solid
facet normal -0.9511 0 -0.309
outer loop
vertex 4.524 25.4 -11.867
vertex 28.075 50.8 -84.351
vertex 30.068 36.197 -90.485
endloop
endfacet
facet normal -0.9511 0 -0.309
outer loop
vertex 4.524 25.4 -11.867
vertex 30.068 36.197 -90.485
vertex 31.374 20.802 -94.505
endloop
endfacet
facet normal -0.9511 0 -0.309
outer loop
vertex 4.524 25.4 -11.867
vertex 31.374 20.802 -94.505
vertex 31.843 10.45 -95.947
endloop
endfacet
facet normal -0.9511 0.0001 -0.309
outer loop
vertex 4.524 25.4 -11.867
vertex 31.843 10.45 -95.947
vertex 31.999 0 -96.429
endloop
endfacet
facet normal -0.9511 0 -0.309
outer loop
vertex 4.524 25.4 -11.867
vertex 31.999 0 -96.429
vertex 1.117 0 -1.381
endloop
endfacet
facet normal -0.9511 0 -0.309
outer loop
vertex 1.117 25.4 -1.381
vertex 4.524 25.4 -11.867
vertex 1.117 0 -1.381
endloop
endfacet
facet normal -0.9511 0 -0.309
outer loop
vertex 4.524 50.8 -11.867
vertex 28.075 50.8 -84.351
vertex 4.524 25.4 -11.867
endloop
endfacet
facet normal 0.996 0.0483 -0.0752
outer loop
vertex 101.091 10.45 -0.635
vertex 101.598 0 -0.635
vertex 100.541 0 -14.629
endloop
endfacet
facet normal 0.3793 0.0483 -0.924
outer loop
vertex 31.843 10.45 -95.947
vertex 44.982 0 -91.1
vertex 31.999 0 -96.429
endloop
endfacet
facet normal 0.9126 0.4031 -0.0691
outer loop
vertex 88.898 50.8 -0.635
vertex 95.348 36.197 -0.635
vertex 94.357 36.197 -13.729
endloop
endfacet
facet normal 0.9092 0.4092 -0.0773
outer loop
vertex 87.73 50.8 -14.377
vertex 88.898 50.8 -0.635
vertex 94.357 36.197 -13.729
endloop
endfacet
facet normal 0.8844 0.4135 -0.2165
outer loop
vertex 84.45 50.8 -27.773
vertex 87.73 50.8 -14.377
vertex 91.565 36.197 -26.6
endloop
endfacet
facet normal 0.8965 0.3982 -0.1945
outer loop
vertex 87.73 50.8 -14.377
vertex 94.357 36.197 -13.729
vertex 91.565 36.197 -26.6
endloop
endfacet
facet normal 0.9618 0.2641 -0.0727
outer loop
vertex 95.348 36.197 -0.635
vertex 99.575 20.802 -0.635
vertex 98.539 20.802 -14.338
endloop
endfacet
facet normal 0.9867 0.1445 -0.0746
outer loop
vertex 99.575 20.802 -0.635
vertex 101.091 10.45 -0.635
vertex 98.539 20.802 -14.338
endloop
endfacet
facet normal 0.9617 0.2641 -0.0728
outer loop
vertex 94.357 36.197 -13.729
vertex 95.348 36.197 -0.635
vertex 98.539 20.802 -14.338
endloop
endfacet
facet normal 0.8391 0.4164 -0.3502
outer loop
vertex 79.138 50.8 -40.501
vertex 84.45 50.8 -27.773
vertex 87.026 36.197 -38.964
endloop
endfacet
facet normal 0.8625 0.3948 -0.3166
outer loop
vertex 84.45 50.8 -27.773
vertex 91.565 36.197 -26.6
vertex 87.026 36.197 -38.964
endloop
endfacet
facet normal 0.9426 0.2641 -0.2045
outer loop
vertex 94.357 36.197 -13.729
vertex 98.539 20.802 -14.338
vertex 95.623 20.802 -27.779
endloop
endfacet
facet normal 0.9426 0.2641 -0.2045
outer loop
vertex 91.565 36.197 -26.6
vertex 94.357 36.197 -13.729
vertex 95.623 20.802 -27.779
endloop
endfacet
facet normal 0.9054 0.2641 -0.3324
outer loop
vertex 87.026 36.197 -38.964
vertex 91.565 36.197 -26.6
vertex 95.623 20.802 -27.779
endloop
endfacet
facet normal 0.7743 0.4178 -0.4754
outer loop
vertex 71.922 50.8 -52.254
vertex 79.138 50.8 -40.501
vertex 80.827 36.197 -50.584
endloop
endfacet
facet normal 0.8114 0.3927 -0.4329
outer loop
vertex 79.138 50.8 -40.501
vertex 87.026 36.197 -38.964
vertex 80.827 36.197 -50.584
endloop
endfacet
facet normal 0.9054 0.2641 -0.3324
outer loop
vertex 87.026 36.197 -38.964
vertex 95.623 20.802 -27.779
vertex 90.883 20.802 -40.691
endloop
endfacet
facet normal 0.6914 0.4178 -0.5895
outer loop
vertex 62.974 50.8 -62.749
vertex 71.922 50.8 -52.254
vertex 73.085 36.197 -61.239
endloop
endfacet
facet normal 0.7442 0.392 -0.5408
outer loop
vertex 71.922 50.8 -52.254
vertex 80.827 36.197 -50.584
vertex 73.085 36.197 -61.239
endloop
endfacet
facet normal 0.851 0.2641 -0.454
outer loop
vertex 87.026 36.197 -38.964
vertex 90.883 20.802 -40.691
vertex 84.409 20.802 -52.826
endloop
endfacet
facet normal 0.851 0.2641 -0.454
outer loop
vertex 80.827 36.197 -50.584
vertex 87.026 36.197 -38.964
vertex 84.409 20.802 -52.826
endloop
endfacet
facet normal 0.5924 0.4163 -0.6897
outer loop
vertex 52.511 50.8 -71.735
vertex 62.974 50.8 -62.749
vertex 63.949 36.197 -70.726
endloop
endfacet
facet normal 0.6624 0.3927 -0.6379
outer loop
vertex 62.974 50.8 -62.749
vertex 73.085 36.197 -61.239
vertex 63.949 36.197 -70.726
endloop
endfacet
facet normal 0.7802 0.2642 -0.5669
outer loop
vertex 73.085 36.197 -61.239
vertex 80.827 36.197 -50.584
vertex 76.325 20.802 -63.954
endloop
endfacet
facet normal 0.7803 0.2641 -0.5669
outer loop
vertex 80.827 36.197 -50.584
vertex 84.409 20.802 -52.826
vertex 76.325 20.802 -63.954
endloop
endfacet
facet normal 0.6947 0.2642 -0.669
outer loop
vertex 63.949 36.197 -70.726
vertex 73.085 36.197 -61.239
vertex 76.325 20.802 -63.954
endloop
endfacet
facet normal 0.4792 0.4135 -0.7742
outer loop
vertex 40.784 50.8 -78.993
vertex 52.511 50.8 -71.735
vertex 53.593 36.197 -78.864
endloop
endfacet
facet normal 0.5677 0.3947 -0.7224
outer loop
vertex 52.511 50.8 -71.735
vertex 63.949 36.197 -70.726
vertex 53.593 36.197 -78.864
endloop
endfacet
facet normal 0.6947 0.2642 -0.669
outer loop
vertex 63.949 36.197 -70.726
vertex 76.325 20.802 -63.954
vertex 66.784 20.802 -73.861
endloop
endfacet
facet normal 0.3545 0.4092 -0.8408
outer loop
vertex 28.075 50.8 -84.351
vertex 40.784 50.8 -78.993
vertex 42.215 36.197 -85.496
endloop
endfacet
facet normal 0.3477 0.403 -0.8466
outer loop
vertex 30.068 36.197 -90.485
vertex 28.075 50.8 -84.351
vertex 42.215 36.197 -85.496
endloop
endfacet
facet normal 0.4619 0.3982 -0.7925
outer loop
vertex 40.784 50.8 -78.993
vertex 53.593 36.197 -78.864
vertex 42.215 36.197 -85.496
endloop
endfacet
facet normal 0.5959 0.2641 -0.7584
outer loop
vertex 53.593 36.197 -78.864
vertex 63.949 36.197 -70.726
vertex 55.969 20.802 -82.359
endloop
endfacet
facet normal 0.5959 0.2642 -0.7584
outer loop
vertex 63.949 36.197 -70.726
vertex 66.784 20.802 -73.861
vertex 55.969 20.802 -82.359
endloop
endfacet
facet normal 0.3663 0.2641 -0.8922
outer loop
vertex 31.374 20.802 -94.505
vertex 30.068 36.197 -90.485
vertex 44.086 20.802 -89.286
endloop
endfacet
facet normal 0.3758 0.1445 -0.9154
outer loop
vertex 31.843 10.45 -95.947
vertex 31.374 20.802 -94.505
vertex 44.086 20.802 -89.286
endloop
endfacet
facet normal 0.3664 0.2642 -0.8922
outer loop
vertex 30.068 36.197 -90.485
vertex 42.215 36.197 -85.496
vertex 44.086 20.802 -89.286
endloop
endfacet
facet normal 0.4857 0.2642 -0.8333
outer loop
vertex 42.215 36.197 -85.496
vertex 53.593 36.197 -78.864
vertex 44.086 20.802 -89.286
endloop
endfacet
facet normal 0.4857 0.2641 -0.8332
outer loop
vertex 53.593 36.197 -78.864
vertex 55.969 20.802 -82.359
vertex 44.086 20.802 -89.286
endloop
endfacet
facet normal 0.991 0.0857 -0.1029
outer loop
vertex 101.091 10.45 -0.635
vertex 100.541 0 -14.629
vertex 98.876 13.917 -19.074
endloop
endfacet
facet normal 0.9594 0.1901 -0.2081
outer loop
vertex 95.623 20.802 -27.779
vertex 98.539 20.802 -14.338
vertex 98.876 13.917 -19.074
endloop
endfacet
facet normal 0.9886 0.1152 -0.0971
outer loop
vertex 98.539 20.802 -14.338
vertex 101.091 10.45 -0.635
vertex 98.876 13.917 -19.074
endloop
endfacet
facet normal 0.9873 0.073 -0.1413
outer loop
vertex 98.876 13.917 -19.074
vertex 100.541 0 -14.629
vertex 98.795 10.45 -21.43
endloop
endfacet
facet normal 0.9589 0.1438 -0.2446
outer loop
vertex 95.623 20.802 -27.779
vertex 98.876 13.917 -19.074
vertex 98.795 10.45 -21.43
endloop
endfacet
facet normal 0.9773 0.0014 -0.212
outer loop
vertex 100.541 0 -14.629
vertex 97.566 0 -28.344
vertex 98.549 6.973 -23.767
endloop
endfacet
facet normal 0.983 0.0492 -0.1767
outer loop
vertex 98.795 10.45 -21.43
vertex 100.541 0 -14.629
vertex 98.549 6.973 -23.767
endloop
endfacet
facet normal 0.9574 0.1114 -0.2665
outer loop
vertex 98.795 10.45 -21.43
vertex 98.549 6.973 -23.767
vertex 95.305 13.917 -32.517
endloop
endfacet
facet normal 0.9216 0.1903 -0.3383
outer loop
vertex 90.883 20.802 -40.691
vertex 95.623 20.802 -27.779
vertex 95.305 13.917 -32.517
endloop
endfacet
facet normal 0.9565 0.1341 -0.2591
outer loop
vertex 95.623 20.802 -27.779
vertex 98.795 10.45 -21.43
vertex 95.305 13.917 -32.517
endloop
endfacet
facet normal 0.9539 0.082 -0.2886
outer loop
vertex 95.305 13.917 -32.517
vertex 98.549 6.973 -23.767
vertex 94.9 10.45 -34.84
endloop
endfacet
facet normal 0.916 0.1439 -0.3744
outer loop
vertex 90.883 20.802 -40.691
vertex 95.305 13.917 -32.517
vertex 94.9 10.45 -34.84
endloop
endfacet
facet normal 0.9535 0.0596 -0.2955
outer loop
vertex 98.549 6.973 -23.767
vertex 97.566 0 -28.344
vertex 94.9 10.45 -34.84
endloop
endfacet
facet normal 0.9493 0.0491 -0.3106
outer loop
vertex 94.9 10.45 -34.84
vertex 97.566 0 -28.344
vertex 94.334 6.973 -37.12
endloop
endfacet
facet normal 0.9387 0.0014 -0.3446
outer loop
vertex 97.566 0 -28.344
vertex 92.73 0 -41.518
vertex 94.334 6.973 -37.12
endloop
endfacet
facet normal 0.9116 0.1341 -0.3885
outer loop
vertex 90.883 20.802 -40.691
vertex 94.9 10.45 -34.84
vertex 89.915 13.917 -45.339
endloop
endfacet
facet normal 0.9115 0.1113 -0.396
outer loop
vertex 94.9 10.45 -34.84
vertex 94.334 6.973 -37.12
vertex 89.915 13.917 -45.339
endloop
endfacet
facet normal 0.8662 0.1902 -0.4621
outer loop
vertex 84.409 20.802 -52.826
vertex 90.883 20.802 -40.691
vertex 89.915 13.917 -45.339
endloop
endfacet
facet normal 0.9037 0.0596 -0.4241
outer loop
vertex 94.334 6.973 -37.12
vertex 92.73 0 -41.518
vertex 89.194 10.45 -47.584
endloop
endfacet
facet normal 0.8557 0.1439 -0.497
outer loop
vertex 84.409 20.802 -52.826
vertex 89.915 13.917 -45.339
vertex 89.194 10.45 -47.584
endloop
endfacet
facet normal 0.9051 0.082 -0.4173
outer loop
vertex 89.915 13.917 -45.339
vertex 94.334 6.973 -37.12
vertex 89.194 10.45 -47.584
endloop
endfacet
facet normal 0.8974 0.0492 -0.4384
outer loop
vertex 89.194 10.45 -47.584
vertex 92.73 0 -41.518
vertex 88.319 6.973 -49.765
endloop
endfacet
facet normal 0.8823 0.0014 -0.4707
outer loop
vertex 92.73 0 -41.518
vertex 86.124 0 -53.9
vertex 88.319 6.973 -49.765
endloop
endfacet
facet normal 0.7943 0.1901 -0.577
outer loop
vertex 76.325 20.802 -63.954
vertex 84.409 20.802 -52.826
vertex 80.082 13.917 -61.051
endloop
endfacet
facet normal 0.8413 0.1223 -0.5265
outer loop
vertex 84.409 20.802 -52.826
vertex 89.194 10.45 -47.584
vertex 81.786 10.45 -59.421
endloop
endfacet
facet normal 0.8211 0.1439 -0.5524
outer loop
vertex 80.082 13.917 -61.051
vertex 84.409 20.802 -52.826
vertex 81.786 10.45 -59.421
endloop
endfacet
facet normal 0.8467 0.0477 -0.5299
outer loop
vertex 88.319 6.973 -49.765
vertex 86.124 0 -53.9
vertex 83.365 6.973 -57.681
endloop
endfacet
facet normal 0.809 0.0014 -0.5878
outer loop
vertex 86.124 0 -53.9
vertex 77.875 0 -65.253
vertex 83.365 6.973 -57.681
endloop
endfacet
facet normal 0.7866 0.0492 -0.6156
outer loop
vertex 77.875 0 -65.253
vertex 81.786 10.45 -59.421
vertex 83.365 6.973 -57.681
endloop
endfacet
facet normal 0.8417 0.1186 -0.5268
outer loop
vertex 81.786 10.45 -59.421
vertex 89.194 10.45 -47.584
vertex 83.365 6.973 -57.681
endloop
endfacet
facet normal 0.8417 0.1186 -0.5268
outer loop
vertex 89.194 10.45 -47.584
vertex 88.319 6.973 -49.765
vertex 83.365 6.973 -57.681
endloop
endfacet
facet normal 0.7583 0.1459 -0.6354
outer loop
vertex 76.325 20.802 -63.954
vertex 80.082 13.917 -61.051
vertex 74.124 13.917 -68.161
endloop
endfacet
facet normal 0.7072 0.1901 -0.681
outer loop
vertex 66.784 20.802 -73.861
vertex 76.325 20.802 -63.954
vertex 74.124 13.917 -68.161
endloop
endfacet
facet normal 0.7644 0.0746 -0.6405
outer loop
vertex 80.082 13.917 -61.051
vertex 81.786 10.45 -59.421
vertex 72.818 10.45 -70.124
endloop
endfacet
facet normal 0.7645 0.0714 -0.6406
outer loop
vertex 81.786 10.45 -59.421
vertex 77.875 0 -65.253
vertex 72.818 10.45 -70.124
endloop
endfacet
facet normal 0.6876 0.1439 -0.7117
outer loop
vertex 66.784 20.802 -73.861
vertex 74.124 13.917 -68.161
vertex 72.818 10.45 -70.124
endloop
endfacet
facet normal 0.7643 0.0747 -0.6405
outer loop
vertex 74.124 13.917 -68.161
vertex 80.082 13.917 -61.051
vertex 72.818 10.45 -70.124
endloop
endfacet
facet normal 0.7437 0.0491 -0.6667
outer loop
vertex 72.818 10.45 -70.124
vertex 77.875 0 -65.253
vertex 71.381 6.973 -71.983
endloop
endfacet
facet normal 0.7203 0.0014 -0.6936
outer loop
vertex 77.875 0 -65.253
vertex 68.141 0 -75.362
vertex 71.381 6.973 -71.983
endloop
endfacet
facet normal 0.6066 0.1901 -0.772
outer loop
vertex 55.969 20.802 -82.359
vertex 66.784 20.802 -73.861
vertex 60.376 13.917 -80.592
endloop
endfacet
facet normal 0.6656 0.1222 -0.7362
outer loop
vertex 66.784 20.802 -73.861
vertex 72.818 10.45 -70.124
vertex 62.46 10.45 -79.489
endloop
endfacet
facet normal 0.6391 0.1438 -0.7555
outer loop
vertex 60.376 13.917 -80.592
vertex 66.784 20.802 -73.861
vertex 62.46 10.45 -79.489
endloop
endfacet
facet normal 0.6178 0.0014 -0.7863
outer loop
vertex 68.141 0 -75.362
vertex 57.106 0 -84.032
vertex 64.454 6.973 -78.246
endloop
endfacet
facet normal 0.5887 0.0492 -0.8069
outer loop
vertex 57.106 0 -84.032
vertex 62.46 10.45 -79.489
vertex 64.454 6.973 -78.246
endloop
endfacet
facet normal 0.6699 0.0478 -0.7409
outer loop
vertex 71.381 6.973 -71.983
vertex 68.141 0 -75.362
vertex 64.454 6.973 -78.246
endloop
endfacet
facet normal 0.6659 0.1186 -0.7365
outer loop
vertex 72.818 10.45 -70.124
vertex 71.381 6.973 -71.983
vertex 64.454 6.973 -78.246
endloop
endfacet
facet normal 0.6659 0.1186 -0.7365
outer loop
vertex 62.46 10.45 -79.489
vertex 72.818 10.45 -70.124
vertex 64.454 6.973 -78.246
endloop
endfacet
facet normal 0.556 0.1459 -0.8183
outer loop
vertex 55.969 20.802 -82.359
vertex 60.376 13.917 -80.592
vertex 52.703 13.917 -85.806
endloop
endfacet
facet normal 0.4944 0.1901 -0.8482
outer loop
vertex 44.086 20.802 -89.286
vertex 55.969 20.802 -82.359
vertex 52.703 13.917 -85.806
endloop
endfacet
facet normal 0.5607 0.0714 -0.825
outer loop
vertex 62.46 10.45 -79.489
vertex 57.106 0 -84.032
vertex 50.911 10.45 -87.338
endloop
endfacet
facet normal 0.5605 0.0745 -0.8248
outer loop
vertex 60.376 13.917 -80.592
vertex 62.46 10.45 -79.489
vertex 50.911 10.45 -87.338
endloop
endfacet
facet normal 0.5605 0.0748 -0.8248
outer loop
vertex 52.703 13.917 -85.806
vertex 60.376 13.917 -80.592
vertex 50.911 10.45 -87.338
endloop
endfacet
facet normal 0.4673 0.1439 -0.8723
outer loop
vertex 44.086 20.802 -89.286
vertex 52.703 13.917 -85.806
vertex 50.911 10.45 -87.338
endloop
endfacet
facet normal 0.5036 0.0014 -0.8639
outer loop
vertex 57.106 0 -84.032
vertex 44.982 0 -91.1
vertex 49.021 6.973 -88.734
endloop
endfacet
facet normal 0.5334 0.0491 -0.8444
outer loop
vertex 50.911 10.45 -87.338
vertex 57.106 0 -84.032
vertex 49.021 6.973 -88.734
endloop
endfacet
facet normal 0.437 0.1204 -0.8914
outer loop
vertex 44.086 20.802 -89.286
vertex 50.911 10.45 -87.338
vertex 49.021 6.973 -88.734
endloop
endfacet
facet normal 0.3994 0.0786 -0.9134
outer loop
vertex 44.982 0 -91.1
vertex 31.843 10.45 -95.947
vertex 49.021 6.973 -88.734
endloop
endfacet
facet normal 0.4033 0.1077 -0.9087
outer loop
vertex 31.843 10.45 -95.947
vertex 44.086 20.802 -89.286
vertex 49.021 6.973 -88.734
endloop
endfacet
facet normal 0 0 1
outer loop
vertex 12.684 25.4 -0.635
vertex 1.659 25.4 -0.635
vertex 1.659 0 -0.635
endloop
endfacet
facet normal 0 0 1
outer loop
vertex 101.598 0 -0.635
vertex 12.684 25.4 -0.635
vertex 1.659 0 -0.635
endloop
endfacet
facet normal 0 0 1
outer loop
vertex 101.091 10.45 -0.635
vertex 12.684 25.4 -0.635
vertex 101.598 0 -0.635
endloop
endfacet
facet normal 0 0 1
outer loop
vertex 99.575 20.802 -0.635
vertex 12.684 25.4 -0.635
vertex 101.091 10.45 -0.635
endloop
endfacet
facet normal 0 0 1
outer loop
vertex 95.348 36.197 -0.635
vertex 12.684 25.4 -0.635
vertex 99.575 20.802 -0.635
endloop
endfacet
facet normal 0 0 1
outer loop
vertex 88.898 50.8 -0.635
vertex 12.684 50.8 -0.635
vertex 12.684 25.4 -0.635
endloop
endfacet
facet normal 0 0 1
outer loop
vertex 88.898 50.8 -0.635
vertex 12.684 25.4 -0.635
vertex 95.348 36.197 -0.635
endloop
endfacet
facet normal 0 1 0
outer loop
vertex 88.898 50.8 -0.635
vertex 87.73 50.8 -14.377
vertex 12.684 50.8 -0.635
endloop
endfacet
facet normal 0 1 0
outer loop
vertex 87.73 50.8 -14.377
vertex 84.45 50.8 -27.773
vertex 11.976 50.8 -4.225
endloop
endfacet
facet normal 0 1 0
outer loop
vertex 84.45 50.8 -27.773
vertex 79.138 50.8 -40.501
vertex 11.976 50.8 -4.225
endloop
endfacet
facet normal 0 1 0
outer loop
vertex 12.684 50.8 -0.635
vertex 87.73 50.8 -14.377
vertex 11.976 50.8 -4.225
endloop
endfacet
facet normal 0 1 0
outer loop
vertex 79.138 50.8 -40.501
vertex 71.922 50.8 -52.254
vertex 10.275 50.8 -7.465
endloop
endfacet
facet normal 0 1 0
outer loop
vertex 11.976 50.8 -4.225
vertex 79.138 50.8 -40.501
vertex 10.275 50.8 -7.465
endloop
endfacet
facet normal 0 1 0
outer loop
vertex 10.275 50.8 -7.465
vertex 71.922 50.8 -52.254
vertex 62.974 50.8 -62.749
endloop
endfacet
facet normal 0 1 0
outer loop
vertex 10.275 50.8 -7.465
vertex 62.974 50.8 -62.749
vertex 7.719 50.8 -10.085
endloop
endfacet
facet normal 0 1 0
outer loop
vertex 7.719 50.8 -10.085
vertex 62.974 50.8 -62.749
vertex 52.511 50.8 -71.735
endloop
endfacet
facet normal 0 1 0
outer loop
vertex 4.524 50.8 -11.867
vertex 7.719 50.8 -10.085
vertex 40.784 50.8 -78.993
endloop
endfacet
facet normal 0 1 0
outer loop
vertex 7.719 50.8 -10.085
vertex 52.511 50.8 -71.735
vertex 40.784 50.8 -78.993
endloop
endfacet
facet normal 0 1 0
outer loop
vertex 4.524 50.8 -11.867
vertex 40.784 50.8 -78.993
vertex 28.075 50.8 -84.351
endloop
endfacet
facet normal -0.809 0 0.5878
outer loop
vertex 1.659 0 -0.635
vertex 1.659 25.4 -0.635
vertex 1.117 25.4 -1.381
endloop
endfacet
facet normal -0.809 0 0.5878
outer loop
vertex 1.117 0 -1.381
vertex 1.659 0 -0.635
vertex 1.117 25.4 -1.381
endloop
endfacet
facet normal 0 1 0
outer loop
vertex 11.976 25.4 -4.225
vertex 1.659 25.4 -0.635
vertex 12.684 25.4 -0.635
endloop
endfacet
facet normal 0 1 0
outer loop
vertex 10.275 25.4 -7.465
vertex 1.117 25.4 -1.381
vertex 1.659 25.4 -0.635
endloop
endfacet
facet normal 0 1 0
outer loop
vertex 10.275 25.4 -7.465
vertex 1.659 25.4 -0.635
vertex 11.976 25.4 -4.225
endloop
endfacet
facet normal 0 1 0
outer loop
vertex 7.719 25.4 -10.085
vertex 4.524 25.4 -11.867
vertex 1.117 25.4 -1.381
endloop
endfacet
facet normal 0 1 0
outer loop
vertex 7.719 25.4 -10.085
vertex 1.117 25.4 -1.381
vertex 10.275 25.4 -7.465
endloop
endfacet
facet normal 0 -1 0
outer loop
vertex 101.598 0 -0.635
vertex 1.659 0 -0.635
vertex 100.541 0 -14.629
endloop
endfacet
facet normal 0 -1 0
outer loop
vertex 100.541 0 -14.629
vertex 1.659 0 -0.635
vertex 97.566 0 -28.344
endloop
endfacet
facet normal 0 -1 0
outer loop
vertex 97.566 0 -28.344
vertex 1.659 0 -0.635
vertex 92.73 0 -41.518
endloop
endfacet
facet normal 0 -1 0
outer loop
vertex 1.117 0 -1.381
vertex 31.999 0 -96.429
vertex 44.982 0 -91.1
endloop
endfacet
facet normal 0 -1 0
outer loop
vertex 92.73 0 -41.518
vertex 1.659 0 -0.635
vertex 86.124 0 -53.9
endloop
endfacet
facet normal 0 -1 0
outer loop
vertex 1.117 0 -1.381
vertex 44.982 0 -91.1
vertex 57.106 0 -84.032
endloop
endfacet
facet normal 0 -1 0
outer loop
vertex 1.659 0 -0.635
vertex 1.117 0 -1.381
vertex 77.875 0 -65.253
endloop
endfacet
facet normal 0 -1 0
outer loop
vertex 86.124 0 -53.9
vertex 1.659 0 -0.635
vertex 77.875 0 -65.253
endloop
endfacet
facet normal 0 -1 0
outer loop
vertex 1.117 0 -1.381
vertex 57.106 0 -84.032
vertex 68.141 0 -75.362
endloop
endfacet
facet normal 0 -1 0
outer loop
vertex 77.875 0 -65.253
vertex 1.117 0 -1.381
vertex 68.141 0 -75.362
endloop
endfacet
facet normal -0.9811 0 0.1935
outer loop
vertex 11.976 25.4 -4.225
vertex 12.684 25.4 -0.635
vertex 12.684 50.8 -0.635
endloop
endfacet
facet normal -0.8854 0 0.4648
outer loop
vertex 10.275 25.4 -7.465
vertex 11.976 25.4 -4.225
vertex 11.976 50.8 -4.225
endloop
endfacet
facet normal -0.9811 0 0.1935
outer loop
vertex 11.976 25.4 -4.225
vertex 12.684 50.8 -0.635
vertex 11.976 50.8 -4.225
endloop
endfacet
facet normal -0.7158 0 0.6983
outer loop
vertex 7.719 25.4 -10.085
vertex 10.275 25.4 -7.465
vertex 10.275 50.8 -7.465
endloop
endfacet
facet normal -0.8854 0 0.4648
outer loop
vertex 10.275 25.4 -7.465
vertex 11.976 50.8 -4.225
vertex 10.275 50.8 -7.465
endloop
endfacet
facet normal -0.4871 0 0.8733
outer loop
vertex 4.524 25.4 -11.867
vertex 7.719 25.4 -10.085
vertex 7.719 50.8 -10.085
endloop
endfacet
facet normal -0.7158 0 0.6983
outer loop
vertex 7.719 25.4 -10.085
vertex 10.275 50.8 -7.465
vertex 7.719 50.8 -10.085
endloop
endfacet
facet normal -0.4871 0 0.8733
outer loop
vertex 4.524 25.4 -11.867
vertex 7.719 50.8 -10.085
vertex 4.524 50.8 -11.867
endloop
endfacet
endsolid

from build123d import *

# Parameters (mm, degrees)
REVOLVE1_ANGLE     = 72
CUT_EXTRUDE2_DEPTH = 0.635
CUT_EXTRUDE3_DEPTH = 0.635
SKETCH2_R          = 12.7
CUT_EXTRUDE1_DEPTH = 25.4
CUT_EXTRUDE4_REACH = 144.358


with BuildPart() as part:
    # Sketch1 → Revolve1 (revolve)
    with BuildSketch(Plane.XY):
        with BuildLine():
            Line((0, 0), (0, 50.8))
            Line((0, 50.8), (88.9, 50.8))
            ThreePointArc((88.9, 50.8), (98.376882891, 26.181720723), (101.6, 0))
            Line((101.6, 0), (0, 0))
        make_face()
    revolve(axis=Axis((0, 0, 0), (0, 1, 0)), revolution_arc=REVOLVE1_ANGLE)

    # Sketch3 → Cut-Extrude2 (cut)
    with BuildSketch(Plane(origin=(0, 0, 0), x_dir=(-0.3090169943749449, 0, 0.9510565162951544), z_dir=(-0.9510565162951544, 0, -0.3090169943749449))):
        with BuildLine():
            Line((0, 50.8), (-88.9, 50.8))
            ThreePointArc((-88.9, 50.8), (-98.376882891, 26.181720723), (-101.6, 0))
            Line((-101.6, 0), (0, 0))
            Line((0, 0), (0, 50.8))
        make_face()
    extrude(amount=-CUT_EXTRUDE2_DEPTH, mode=Mode.SUBTRACT)

    # Sketch4 → Cut-Extrude3 (cut)
    with BuildSketch(Plane.XY):
        with BuildLine():
            Line((0.667678512, 50.8), (0.667678512, 0))
            Line((0.667678512, 0), (101.6, 0))
            ThreePointArc((101.6, 0), (98.376882891, 26.181720723), (88.9, 50.8))
            Line((88.9, 50.8), (0.667678512, 50.8))
        make_face()
    extrude(amount=-CUT_EXTRUDE3_DEPTH, mode=Mode.SUBTRACT)

    # Sketch2 → Cut-Extrude1 (cut)
    with BuildSketch(Plane(origin=(0, 50.8, 0), x_dir=(1, 0, 0), z_dir=(0, 1, 0))):
        Circle(SKETCH2_R)
    extrude(amount=-CUT_EXTRUDE1_DEPTH, mode=Mode.SUBTRACT)

    # Sketch5 → Cut-Extrude4 (cut, up to next)
    with BuildSketch(Plane(origin=(0, 25.4, 0), x_dir=(1, 0, 0), z_dir=(0, 1, 0)), mode=Mode.PRIVATE) as cut_extrude4_sk1:
        Polygon((1.658905685, 0.635), (1.116550937, 1.38148727), (0.874002519, 0.635), align=None)
    cut_extrude4_tool1 = extrude(cut_extrude4_sk1.sketch, amount=-CUT_EXTRUDE4_REACH, mode=Mode.PRIVATE) & part.part
    add(cut_extrude4_tool1.solids().sort_by_distance((1.216486, 25.4, -0.883829))[0], mode=Mode.SUBTRACT)


solid = part.part
